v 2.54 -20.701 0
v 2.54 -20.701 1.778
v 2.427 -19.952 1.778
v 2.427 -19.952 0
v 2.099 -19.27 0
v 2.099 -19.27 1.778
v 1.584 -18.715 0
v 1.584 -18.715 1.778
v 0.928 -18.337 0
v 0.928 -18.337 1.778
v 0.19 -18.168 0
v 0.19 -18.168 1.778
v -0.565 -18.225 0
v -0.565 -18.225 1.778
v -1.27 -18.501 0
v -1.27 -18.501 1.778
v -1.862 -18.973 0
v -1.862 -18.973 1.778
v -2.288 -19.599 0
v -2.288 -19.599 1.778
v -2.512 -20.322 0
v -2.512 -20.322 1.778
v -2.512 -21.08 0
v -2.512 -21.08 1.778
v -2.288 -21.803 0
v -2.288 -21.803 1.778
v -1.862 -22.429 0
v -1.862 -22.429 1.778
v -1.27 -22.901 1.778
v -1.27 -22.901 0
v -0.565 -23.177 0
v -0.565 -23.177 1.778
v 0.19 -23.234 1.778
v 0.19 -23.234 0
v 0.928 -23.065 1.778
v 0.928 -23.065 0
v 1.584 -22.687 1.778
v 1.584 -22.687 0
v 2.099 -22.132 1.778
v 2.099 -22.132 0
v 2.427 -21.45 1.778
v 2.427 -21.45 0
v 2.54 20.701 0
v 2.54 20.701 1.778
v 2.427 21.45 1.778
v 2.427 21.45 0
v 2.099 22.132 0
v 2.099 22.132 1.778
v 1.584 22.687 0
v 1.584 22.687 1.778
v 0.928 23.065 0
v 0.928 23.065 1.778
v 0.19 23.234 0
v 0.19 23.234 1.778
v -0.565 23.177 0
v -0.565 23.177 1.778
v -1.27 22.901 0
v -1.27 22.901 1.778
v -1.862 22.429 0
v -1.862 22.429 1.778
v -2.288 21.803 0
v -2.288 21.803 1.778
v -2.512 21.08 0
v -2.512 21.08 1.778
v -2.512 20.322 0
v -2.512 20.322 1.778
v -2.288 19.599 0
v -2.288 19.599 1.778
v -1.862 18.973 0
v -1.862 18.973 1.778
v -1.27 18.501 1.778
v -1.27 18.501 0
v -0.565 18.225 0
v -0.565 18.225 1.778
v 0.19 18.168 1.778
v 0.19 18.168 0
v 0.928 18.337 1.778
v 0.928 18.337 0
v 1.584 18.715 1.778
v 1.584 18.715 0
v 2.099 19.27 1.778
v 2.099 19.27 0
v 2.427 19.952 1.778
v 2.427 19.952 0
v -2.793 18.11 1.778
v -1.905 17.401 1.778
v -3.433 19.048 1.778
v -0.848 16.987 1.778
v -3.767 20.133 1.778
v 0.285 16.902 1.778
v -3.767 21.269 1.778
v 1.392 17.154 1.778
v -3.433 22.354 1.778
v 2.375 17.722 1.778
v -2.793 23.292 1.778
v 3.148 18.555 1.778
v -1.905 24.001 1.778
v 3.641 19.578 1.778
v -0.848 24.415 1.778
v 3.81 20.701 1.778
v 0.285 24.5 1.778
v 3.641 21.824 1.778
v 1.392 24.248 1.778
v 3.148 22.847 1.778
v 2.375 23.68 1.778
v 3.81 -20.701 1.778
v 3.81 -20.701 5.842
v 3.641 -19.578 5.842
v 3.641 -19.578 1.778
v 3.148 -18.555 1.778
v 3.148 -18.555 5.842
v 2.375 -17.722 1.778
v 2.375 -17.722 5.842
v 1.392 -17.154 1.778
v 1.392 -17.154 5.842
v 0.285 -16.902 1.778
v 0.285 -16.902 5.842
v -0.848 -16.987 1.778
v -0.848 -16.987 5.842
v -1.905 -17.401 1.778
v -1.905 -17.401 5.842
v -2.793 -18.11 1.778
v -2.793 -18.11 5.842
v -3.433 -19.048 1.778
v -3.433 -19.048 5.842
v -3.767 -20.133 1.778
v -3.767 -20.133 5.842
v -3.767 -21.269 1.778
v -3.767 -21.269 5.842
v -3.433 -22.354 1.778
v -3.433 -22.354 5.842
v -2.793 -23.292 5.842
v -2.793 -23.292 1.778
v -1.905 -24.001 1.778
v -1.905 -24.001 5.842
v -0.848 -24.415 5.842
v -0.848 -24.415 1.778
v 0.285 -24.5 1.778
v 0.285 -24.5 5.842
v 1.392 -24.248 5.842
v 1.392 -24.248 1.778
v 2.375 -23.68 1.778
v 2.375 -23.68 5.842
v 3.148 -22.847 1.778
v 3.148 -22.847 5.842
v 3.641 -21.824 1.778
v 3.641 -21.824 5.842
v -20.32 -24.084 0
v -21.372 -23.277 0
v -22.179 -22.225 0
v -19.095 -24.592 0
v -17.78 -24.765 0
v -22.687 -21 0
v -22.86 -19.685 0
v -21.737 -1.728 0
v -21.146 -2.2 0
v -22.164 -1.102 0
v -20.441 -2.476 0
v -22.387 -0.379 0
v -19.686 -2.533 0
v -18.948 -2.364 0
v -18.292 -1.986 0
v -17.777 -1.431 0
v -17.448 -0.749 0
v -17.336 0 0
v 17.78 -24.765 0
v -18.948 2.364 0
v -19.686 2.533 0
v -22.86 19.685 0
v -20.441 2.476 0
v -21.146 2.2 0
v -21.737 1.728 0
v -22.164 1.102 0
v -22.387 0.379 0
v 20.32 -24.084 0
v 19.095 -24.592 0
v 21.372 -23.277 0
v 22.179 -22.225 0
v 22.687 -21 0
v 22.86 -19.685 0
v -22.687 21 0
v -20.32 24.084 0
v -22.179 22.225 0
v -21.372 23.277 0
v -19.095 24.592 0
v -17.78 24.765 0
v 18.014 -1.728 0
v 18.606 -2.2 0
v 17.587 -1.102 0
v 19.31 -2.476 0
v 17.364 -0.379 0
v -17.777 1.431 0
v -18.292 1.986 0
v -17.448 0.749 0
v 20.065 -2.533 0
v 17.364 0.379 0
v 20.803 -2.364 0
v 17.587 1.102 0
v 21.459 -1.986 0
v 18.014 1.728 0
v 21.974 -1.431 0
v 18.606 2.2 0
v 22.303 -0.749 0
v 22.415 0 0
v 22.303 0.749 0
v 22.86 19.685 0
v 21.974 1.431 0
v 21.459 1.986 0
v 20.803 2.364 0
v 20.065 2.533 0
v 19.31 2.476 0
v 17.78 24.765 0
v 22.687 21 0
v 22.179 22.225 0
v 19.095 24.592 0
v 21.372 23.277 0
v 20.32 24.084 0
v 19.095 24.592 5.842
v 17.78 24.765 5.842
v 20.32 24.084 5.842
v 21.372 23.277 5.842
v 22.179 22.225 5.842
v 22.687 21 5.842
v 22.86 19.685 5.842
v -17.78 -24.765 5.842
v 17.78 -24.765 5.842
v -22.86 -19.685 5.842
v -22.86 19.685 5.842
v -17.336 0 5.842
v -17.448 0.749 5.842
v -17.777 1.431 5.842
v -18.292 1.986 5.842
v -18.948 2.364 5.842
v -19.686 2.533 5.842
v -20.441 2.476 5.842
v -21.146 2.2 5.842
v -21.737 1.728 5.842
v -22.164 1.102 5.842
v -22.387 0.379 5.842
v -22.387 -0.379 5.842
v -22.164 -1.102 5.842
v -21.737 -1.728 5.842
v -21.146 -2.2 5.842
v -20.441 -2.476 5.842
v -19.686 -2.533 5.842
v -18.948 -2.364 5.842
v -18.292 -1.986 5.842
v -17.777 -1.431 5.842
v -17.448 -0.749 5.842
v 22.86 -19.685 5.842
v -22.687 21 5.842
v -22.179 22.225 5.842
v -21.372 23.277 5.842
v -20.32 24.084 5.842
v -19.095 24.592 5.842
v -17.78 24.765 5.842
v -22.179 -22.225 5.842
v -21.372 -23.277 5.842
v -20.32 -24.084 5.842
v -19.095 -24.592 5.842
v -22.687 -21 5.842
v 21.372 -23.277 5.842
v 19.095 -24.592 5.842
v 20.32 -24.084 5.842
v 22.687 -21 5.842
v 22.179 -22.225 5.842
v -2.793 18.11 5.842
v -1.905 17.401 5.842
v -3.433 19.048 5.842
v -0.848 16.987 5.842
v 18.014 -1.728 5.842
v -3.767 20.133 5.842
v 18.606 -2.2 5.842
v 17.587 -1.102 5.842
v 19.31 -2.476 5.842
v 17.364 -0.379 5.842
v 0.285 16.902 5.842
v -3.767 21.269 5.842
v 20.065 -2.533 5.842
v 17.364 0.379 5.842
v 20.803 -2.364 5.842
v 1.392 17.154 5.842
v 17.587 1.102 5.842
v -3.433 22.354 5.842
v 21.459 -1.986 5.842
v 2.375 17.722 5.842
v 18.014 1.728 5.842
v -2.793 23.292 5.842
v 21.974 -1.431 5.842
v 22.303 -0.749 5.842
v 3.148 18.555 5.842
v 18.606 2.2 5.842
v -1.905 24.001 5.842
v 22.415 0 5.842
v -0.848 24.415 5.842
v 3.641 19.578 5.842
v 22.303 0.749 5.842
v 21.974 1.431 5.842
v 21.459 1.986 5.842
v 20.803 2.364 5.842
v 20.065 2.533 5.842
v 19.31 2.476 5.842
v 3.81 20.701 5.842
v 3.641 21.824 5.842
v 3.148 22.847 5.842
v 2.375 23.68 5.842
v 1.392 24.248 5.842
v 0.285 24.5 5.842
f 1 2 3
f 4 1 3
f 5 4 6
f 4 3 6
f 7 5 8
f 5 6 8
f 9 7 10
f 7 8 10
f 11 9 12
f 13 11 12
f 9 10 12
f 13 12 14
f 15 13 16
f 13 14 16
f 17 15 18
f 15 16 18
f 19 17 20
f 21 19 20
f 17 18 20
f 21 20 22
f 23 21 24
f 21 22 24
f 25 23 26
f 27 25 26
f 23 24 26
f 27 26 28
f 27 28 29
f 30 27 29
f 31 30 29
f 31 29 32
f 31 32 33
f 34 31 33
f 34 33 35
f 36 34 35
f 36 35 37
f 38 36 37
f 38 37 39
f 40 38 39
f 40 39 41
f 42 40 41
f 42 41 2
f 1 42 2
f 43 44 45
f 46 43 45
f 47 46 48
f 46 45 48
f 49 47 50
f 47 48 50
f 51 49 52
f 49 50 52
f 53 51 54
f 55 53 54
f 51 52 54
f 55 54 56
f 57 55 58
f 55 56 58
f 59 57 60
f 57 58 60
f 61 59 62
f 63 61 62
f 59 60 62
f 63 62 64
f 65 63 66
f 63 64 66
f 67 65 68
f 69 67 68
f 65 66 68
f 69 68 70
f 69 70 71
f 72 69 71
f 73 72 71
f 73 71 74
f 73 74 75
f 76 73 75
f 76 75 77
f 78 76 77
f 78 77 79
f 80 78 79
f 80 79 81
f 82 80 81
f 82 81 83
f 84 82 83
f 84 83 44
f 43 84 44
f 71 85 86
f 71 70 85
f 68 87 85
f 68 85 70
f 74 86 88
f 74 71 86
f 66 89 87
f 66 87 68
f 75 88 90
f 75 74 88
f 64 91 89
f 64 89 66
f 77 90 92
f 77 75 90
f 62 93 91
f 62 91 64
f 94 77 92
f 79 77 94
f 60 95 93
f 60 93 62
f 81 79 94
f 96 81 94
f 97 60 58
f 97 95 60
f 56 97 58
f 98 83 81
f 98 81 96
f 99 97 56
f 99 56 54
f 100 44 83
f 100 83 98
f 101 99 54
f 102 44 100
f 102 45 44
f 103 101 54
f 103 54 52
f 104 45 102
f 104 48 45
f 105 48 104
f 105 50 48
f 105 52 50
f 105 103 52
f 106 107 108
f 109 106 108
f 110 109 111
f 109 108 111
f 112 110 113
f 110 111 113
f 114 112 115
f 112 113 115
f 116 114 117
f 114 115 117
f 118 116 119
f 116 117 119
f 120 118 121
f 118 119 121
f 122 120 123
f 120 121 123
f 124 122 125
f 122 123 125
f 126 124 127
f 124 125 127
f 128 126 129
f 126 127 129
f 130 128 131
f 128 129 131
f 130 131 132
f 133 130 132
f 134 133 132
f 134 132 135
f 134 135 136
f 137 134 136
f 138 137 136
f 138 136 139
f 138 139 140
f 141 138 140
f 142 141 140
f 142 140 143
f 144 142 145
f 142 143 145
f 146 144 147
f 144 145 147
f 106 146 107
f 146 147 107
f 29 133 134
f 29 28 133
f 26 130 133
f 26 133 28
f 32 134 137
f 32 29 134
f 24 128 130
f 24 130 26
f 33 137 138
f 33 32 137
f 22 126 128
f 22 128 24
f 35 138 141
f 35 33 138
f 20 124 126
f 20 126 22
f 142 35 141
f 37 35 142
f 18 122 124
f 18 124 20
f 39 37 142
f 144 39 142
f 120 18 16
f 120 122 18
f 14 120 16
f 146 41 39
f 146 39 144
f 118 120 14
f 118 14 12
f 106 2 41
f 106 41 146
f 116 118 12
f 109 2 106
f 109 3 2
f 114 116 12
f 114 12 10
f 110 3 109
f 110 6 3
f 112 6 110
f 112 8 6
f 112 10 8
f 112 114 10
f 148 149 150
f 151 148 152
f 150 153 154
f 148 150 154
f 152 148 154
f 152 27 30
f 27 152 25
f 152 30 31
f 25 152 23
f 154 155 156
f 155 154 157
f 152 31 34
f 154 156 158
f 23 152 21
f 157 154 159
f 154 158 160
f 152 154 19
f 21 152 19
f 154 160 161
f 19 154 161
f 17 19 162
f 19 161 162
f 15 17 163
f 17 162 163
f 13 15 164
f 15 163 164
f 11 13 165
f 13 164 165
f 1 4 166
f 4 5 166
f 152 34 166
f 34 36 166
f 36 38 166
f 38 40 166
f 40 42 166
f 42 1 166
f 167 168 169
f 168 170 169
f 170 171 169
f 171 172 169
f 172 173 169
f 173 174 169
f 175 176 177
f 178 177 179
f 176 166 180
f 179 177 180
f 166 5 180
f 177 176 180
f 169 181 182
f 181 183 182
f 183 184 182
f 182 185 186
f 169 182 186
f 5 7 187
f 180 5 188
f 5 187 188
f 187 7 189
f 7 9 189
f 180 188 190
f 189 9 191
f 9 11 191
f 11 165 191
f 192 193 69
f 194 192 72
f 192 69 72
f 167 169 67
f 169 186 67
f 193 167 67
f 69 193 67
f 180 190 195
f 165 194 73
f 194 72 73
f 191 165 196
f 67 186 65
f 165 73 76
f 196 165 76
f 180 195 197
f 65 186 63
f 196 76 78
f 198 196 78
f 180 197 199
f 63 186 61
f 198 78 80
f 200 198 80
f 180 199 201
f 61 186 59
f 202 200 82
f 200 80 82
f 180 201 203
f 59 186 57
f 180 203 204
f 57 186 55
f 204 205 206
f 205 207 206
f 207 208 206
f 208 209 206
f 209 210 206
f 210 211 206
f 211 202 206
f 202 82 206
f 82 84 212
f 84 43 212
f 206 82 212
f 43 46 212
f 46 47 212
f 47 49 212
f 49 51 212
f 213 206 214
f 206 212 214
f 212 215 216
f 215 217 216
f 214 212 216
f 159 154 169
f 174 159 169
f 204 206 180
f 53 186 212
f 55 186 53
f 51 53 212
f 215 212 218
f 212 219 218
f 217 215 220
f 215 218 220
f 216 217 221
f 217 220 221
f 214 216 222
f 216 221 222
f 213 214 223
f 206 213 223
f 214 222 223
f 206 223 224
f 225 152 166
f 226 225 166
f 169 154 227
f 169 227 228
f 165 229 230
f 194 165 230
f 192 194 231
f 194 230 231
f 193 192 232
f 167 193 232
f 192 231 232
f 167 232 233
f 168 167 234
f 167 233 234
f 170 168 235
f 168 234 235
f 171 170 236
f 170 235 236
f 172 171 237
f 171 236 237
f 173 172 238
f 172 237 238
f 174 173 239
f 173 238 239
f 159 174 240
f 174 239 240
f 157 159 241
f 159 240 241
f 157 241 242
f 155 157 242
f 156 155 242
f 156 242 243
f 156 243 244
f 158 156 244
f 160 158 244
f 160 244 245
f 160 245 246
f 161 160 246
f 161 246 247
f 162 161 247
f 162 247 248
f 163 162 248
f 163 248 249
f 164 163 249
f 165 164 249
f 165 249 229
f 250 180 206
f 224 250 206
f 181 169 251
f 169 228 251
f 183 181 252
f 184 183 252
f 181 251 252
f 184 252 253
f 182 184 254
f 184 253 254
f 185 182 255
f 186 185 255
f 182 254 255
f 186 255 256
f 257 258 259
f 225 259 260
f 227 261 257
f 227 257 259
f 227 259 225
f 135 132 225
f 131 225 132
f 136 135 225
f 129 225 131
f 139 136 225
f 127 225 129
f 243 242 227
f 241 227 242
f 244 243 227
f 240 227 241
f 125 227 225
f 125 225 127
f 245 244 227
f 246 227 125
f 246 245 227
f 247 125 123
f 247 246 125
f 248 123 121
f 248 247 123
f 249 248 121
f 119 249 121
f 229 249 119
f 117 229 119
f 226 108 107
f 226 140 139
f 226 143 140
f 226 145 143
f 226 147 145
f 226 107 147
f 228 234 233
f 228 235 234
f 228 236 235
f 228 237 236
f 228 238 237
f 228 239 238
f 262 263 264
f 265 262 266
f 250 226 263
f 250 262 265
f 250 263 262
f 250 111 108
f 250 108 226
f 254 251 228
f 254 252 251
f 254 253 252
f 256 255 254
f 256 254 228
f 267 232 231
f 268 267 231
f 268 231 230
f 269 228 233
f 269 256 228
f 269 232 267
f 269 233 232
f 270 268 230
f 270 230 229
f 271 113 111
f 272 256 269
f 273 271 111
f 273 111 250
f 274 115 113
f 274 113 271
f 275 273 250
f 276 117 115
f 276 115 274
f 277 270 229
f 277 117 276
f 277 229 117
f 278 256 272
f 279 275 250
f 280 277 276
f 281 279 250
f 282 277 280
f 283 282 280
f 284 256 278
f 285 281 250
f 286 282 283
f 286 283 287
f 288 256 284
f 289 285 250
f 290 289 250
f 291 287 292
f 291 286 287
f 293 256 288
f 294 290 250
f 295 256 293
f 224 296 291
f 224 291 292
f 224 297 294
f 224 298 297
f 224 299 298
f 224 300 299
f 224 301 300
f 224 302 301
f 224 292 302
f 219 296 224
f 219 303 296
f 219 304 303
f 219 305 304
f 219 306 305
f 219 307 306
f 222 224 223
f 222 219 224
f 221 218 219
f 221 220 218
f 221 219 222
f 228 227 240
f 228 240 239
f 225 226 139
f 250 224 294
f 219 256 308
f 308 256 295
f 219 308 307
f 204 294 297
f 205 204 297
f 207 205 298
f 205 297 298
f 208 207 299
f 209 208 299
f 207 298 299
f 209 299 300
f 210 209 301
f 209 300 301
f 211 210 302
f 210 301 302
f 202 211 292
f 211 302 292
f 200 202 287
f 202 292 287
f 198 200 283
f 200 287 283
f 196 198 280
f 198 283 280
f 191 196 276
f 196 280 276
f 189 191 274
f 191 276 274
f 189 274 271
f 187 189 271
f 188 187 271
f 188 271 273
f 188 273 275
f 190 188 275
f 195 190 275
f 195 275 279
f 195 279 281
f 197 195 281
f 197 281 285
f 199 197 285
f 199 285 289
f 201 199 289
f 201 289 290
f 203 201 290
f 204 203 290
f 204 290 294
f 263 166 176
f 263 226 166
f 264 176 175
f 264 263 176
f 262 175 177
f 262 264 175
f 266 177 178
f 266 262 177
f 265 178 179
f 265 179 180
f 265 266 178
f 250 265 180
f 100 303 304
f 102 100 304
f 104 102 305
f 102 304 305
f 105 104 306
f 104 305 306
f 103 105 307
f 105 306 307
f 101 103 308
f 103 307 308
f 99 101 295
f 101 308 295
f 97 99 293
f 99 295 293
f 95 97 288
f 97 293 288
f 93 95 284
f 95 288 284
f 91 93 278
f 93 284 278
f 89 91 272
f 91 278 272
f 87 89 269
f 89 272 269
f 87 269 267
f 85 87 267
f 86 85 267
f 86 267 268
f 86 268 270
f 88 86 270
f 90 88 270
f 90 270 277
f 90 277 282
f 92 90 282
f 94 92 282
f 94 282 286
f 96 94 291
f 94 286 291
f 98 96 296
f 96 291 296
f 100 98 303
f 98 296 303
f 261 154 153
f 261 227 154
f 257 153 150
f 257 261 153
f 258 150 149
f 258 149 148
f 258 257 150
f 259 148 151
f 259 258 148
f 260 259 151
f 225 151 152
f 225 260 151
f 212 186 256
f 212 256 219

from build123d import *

# Parameters (mm, degrees)
F0_W     = 45.72
F0_H     = 49.53
F1_DEPTH = 5.842
F2_R     = 2.54
F3_DEPTH = 25.4
F4_R     = 3.81
F5_DEPTH = 4.064
F6_R     = 2.54
F7_DEPTH = 25.4
F8_R     = 5.08


# Not quite as in the source:
# - a feature names something its author has since deleted; it is built from what else it names


with BuildPart() as f1:
    # F0 (on Top) → F1 (new body)
    with BuildSketch(Plane.XY):
        Rectangle(F0_W, F0_H)
    extrude(amount=F1_DEPTH)

    # F2 (on face) → F3 (cut)
    with BuildSketch(Plane.XY.offset(5.842)):
        with Locations((-19.8755, 0)):
            Circle(F2_R)
        with Locations((19.8755, 0)):
            Circle(F2_R)
    extrude(amount=-F3_DEPTH, mode=Mode.SUBTRACT)

    # F4 (on face) → F5 (cut)
    with BuildSketch(Plane.XY.offset(5.842)):
        with Locations((0, 20.701)):
            Circle(F4_R)
        with Locations((0, -20.701)):
            Circle(F4_R)
    extrude(amount=-F5_DEPTH, mode=Mode.SUBTRACT)

    # F6 (on face) → F7 (cut)
    with BuildSketch(Plane.XY.offset(5.842)):
        with Locations((0, 20.701)):
            Circle(F6_R)
        with Locations((0, -20.701)):
            Circle(F6_R)
    extrude(amount=-F7_DEPTH, mode=Mode.SUBTRACT)

    # F8
    f8_edges = [f1.edges().sort_by_distance(p)[0] for p in [
        (-22.86, 24.765, 2.921),
        (-22.86, -24.765, 2.921),
        (22.86, -24.765, 2.921),
        (22.86, 24.765, 2.921),
    ]]
    fillet(f8_edges, radius=F8_R)


solid = f1.part
